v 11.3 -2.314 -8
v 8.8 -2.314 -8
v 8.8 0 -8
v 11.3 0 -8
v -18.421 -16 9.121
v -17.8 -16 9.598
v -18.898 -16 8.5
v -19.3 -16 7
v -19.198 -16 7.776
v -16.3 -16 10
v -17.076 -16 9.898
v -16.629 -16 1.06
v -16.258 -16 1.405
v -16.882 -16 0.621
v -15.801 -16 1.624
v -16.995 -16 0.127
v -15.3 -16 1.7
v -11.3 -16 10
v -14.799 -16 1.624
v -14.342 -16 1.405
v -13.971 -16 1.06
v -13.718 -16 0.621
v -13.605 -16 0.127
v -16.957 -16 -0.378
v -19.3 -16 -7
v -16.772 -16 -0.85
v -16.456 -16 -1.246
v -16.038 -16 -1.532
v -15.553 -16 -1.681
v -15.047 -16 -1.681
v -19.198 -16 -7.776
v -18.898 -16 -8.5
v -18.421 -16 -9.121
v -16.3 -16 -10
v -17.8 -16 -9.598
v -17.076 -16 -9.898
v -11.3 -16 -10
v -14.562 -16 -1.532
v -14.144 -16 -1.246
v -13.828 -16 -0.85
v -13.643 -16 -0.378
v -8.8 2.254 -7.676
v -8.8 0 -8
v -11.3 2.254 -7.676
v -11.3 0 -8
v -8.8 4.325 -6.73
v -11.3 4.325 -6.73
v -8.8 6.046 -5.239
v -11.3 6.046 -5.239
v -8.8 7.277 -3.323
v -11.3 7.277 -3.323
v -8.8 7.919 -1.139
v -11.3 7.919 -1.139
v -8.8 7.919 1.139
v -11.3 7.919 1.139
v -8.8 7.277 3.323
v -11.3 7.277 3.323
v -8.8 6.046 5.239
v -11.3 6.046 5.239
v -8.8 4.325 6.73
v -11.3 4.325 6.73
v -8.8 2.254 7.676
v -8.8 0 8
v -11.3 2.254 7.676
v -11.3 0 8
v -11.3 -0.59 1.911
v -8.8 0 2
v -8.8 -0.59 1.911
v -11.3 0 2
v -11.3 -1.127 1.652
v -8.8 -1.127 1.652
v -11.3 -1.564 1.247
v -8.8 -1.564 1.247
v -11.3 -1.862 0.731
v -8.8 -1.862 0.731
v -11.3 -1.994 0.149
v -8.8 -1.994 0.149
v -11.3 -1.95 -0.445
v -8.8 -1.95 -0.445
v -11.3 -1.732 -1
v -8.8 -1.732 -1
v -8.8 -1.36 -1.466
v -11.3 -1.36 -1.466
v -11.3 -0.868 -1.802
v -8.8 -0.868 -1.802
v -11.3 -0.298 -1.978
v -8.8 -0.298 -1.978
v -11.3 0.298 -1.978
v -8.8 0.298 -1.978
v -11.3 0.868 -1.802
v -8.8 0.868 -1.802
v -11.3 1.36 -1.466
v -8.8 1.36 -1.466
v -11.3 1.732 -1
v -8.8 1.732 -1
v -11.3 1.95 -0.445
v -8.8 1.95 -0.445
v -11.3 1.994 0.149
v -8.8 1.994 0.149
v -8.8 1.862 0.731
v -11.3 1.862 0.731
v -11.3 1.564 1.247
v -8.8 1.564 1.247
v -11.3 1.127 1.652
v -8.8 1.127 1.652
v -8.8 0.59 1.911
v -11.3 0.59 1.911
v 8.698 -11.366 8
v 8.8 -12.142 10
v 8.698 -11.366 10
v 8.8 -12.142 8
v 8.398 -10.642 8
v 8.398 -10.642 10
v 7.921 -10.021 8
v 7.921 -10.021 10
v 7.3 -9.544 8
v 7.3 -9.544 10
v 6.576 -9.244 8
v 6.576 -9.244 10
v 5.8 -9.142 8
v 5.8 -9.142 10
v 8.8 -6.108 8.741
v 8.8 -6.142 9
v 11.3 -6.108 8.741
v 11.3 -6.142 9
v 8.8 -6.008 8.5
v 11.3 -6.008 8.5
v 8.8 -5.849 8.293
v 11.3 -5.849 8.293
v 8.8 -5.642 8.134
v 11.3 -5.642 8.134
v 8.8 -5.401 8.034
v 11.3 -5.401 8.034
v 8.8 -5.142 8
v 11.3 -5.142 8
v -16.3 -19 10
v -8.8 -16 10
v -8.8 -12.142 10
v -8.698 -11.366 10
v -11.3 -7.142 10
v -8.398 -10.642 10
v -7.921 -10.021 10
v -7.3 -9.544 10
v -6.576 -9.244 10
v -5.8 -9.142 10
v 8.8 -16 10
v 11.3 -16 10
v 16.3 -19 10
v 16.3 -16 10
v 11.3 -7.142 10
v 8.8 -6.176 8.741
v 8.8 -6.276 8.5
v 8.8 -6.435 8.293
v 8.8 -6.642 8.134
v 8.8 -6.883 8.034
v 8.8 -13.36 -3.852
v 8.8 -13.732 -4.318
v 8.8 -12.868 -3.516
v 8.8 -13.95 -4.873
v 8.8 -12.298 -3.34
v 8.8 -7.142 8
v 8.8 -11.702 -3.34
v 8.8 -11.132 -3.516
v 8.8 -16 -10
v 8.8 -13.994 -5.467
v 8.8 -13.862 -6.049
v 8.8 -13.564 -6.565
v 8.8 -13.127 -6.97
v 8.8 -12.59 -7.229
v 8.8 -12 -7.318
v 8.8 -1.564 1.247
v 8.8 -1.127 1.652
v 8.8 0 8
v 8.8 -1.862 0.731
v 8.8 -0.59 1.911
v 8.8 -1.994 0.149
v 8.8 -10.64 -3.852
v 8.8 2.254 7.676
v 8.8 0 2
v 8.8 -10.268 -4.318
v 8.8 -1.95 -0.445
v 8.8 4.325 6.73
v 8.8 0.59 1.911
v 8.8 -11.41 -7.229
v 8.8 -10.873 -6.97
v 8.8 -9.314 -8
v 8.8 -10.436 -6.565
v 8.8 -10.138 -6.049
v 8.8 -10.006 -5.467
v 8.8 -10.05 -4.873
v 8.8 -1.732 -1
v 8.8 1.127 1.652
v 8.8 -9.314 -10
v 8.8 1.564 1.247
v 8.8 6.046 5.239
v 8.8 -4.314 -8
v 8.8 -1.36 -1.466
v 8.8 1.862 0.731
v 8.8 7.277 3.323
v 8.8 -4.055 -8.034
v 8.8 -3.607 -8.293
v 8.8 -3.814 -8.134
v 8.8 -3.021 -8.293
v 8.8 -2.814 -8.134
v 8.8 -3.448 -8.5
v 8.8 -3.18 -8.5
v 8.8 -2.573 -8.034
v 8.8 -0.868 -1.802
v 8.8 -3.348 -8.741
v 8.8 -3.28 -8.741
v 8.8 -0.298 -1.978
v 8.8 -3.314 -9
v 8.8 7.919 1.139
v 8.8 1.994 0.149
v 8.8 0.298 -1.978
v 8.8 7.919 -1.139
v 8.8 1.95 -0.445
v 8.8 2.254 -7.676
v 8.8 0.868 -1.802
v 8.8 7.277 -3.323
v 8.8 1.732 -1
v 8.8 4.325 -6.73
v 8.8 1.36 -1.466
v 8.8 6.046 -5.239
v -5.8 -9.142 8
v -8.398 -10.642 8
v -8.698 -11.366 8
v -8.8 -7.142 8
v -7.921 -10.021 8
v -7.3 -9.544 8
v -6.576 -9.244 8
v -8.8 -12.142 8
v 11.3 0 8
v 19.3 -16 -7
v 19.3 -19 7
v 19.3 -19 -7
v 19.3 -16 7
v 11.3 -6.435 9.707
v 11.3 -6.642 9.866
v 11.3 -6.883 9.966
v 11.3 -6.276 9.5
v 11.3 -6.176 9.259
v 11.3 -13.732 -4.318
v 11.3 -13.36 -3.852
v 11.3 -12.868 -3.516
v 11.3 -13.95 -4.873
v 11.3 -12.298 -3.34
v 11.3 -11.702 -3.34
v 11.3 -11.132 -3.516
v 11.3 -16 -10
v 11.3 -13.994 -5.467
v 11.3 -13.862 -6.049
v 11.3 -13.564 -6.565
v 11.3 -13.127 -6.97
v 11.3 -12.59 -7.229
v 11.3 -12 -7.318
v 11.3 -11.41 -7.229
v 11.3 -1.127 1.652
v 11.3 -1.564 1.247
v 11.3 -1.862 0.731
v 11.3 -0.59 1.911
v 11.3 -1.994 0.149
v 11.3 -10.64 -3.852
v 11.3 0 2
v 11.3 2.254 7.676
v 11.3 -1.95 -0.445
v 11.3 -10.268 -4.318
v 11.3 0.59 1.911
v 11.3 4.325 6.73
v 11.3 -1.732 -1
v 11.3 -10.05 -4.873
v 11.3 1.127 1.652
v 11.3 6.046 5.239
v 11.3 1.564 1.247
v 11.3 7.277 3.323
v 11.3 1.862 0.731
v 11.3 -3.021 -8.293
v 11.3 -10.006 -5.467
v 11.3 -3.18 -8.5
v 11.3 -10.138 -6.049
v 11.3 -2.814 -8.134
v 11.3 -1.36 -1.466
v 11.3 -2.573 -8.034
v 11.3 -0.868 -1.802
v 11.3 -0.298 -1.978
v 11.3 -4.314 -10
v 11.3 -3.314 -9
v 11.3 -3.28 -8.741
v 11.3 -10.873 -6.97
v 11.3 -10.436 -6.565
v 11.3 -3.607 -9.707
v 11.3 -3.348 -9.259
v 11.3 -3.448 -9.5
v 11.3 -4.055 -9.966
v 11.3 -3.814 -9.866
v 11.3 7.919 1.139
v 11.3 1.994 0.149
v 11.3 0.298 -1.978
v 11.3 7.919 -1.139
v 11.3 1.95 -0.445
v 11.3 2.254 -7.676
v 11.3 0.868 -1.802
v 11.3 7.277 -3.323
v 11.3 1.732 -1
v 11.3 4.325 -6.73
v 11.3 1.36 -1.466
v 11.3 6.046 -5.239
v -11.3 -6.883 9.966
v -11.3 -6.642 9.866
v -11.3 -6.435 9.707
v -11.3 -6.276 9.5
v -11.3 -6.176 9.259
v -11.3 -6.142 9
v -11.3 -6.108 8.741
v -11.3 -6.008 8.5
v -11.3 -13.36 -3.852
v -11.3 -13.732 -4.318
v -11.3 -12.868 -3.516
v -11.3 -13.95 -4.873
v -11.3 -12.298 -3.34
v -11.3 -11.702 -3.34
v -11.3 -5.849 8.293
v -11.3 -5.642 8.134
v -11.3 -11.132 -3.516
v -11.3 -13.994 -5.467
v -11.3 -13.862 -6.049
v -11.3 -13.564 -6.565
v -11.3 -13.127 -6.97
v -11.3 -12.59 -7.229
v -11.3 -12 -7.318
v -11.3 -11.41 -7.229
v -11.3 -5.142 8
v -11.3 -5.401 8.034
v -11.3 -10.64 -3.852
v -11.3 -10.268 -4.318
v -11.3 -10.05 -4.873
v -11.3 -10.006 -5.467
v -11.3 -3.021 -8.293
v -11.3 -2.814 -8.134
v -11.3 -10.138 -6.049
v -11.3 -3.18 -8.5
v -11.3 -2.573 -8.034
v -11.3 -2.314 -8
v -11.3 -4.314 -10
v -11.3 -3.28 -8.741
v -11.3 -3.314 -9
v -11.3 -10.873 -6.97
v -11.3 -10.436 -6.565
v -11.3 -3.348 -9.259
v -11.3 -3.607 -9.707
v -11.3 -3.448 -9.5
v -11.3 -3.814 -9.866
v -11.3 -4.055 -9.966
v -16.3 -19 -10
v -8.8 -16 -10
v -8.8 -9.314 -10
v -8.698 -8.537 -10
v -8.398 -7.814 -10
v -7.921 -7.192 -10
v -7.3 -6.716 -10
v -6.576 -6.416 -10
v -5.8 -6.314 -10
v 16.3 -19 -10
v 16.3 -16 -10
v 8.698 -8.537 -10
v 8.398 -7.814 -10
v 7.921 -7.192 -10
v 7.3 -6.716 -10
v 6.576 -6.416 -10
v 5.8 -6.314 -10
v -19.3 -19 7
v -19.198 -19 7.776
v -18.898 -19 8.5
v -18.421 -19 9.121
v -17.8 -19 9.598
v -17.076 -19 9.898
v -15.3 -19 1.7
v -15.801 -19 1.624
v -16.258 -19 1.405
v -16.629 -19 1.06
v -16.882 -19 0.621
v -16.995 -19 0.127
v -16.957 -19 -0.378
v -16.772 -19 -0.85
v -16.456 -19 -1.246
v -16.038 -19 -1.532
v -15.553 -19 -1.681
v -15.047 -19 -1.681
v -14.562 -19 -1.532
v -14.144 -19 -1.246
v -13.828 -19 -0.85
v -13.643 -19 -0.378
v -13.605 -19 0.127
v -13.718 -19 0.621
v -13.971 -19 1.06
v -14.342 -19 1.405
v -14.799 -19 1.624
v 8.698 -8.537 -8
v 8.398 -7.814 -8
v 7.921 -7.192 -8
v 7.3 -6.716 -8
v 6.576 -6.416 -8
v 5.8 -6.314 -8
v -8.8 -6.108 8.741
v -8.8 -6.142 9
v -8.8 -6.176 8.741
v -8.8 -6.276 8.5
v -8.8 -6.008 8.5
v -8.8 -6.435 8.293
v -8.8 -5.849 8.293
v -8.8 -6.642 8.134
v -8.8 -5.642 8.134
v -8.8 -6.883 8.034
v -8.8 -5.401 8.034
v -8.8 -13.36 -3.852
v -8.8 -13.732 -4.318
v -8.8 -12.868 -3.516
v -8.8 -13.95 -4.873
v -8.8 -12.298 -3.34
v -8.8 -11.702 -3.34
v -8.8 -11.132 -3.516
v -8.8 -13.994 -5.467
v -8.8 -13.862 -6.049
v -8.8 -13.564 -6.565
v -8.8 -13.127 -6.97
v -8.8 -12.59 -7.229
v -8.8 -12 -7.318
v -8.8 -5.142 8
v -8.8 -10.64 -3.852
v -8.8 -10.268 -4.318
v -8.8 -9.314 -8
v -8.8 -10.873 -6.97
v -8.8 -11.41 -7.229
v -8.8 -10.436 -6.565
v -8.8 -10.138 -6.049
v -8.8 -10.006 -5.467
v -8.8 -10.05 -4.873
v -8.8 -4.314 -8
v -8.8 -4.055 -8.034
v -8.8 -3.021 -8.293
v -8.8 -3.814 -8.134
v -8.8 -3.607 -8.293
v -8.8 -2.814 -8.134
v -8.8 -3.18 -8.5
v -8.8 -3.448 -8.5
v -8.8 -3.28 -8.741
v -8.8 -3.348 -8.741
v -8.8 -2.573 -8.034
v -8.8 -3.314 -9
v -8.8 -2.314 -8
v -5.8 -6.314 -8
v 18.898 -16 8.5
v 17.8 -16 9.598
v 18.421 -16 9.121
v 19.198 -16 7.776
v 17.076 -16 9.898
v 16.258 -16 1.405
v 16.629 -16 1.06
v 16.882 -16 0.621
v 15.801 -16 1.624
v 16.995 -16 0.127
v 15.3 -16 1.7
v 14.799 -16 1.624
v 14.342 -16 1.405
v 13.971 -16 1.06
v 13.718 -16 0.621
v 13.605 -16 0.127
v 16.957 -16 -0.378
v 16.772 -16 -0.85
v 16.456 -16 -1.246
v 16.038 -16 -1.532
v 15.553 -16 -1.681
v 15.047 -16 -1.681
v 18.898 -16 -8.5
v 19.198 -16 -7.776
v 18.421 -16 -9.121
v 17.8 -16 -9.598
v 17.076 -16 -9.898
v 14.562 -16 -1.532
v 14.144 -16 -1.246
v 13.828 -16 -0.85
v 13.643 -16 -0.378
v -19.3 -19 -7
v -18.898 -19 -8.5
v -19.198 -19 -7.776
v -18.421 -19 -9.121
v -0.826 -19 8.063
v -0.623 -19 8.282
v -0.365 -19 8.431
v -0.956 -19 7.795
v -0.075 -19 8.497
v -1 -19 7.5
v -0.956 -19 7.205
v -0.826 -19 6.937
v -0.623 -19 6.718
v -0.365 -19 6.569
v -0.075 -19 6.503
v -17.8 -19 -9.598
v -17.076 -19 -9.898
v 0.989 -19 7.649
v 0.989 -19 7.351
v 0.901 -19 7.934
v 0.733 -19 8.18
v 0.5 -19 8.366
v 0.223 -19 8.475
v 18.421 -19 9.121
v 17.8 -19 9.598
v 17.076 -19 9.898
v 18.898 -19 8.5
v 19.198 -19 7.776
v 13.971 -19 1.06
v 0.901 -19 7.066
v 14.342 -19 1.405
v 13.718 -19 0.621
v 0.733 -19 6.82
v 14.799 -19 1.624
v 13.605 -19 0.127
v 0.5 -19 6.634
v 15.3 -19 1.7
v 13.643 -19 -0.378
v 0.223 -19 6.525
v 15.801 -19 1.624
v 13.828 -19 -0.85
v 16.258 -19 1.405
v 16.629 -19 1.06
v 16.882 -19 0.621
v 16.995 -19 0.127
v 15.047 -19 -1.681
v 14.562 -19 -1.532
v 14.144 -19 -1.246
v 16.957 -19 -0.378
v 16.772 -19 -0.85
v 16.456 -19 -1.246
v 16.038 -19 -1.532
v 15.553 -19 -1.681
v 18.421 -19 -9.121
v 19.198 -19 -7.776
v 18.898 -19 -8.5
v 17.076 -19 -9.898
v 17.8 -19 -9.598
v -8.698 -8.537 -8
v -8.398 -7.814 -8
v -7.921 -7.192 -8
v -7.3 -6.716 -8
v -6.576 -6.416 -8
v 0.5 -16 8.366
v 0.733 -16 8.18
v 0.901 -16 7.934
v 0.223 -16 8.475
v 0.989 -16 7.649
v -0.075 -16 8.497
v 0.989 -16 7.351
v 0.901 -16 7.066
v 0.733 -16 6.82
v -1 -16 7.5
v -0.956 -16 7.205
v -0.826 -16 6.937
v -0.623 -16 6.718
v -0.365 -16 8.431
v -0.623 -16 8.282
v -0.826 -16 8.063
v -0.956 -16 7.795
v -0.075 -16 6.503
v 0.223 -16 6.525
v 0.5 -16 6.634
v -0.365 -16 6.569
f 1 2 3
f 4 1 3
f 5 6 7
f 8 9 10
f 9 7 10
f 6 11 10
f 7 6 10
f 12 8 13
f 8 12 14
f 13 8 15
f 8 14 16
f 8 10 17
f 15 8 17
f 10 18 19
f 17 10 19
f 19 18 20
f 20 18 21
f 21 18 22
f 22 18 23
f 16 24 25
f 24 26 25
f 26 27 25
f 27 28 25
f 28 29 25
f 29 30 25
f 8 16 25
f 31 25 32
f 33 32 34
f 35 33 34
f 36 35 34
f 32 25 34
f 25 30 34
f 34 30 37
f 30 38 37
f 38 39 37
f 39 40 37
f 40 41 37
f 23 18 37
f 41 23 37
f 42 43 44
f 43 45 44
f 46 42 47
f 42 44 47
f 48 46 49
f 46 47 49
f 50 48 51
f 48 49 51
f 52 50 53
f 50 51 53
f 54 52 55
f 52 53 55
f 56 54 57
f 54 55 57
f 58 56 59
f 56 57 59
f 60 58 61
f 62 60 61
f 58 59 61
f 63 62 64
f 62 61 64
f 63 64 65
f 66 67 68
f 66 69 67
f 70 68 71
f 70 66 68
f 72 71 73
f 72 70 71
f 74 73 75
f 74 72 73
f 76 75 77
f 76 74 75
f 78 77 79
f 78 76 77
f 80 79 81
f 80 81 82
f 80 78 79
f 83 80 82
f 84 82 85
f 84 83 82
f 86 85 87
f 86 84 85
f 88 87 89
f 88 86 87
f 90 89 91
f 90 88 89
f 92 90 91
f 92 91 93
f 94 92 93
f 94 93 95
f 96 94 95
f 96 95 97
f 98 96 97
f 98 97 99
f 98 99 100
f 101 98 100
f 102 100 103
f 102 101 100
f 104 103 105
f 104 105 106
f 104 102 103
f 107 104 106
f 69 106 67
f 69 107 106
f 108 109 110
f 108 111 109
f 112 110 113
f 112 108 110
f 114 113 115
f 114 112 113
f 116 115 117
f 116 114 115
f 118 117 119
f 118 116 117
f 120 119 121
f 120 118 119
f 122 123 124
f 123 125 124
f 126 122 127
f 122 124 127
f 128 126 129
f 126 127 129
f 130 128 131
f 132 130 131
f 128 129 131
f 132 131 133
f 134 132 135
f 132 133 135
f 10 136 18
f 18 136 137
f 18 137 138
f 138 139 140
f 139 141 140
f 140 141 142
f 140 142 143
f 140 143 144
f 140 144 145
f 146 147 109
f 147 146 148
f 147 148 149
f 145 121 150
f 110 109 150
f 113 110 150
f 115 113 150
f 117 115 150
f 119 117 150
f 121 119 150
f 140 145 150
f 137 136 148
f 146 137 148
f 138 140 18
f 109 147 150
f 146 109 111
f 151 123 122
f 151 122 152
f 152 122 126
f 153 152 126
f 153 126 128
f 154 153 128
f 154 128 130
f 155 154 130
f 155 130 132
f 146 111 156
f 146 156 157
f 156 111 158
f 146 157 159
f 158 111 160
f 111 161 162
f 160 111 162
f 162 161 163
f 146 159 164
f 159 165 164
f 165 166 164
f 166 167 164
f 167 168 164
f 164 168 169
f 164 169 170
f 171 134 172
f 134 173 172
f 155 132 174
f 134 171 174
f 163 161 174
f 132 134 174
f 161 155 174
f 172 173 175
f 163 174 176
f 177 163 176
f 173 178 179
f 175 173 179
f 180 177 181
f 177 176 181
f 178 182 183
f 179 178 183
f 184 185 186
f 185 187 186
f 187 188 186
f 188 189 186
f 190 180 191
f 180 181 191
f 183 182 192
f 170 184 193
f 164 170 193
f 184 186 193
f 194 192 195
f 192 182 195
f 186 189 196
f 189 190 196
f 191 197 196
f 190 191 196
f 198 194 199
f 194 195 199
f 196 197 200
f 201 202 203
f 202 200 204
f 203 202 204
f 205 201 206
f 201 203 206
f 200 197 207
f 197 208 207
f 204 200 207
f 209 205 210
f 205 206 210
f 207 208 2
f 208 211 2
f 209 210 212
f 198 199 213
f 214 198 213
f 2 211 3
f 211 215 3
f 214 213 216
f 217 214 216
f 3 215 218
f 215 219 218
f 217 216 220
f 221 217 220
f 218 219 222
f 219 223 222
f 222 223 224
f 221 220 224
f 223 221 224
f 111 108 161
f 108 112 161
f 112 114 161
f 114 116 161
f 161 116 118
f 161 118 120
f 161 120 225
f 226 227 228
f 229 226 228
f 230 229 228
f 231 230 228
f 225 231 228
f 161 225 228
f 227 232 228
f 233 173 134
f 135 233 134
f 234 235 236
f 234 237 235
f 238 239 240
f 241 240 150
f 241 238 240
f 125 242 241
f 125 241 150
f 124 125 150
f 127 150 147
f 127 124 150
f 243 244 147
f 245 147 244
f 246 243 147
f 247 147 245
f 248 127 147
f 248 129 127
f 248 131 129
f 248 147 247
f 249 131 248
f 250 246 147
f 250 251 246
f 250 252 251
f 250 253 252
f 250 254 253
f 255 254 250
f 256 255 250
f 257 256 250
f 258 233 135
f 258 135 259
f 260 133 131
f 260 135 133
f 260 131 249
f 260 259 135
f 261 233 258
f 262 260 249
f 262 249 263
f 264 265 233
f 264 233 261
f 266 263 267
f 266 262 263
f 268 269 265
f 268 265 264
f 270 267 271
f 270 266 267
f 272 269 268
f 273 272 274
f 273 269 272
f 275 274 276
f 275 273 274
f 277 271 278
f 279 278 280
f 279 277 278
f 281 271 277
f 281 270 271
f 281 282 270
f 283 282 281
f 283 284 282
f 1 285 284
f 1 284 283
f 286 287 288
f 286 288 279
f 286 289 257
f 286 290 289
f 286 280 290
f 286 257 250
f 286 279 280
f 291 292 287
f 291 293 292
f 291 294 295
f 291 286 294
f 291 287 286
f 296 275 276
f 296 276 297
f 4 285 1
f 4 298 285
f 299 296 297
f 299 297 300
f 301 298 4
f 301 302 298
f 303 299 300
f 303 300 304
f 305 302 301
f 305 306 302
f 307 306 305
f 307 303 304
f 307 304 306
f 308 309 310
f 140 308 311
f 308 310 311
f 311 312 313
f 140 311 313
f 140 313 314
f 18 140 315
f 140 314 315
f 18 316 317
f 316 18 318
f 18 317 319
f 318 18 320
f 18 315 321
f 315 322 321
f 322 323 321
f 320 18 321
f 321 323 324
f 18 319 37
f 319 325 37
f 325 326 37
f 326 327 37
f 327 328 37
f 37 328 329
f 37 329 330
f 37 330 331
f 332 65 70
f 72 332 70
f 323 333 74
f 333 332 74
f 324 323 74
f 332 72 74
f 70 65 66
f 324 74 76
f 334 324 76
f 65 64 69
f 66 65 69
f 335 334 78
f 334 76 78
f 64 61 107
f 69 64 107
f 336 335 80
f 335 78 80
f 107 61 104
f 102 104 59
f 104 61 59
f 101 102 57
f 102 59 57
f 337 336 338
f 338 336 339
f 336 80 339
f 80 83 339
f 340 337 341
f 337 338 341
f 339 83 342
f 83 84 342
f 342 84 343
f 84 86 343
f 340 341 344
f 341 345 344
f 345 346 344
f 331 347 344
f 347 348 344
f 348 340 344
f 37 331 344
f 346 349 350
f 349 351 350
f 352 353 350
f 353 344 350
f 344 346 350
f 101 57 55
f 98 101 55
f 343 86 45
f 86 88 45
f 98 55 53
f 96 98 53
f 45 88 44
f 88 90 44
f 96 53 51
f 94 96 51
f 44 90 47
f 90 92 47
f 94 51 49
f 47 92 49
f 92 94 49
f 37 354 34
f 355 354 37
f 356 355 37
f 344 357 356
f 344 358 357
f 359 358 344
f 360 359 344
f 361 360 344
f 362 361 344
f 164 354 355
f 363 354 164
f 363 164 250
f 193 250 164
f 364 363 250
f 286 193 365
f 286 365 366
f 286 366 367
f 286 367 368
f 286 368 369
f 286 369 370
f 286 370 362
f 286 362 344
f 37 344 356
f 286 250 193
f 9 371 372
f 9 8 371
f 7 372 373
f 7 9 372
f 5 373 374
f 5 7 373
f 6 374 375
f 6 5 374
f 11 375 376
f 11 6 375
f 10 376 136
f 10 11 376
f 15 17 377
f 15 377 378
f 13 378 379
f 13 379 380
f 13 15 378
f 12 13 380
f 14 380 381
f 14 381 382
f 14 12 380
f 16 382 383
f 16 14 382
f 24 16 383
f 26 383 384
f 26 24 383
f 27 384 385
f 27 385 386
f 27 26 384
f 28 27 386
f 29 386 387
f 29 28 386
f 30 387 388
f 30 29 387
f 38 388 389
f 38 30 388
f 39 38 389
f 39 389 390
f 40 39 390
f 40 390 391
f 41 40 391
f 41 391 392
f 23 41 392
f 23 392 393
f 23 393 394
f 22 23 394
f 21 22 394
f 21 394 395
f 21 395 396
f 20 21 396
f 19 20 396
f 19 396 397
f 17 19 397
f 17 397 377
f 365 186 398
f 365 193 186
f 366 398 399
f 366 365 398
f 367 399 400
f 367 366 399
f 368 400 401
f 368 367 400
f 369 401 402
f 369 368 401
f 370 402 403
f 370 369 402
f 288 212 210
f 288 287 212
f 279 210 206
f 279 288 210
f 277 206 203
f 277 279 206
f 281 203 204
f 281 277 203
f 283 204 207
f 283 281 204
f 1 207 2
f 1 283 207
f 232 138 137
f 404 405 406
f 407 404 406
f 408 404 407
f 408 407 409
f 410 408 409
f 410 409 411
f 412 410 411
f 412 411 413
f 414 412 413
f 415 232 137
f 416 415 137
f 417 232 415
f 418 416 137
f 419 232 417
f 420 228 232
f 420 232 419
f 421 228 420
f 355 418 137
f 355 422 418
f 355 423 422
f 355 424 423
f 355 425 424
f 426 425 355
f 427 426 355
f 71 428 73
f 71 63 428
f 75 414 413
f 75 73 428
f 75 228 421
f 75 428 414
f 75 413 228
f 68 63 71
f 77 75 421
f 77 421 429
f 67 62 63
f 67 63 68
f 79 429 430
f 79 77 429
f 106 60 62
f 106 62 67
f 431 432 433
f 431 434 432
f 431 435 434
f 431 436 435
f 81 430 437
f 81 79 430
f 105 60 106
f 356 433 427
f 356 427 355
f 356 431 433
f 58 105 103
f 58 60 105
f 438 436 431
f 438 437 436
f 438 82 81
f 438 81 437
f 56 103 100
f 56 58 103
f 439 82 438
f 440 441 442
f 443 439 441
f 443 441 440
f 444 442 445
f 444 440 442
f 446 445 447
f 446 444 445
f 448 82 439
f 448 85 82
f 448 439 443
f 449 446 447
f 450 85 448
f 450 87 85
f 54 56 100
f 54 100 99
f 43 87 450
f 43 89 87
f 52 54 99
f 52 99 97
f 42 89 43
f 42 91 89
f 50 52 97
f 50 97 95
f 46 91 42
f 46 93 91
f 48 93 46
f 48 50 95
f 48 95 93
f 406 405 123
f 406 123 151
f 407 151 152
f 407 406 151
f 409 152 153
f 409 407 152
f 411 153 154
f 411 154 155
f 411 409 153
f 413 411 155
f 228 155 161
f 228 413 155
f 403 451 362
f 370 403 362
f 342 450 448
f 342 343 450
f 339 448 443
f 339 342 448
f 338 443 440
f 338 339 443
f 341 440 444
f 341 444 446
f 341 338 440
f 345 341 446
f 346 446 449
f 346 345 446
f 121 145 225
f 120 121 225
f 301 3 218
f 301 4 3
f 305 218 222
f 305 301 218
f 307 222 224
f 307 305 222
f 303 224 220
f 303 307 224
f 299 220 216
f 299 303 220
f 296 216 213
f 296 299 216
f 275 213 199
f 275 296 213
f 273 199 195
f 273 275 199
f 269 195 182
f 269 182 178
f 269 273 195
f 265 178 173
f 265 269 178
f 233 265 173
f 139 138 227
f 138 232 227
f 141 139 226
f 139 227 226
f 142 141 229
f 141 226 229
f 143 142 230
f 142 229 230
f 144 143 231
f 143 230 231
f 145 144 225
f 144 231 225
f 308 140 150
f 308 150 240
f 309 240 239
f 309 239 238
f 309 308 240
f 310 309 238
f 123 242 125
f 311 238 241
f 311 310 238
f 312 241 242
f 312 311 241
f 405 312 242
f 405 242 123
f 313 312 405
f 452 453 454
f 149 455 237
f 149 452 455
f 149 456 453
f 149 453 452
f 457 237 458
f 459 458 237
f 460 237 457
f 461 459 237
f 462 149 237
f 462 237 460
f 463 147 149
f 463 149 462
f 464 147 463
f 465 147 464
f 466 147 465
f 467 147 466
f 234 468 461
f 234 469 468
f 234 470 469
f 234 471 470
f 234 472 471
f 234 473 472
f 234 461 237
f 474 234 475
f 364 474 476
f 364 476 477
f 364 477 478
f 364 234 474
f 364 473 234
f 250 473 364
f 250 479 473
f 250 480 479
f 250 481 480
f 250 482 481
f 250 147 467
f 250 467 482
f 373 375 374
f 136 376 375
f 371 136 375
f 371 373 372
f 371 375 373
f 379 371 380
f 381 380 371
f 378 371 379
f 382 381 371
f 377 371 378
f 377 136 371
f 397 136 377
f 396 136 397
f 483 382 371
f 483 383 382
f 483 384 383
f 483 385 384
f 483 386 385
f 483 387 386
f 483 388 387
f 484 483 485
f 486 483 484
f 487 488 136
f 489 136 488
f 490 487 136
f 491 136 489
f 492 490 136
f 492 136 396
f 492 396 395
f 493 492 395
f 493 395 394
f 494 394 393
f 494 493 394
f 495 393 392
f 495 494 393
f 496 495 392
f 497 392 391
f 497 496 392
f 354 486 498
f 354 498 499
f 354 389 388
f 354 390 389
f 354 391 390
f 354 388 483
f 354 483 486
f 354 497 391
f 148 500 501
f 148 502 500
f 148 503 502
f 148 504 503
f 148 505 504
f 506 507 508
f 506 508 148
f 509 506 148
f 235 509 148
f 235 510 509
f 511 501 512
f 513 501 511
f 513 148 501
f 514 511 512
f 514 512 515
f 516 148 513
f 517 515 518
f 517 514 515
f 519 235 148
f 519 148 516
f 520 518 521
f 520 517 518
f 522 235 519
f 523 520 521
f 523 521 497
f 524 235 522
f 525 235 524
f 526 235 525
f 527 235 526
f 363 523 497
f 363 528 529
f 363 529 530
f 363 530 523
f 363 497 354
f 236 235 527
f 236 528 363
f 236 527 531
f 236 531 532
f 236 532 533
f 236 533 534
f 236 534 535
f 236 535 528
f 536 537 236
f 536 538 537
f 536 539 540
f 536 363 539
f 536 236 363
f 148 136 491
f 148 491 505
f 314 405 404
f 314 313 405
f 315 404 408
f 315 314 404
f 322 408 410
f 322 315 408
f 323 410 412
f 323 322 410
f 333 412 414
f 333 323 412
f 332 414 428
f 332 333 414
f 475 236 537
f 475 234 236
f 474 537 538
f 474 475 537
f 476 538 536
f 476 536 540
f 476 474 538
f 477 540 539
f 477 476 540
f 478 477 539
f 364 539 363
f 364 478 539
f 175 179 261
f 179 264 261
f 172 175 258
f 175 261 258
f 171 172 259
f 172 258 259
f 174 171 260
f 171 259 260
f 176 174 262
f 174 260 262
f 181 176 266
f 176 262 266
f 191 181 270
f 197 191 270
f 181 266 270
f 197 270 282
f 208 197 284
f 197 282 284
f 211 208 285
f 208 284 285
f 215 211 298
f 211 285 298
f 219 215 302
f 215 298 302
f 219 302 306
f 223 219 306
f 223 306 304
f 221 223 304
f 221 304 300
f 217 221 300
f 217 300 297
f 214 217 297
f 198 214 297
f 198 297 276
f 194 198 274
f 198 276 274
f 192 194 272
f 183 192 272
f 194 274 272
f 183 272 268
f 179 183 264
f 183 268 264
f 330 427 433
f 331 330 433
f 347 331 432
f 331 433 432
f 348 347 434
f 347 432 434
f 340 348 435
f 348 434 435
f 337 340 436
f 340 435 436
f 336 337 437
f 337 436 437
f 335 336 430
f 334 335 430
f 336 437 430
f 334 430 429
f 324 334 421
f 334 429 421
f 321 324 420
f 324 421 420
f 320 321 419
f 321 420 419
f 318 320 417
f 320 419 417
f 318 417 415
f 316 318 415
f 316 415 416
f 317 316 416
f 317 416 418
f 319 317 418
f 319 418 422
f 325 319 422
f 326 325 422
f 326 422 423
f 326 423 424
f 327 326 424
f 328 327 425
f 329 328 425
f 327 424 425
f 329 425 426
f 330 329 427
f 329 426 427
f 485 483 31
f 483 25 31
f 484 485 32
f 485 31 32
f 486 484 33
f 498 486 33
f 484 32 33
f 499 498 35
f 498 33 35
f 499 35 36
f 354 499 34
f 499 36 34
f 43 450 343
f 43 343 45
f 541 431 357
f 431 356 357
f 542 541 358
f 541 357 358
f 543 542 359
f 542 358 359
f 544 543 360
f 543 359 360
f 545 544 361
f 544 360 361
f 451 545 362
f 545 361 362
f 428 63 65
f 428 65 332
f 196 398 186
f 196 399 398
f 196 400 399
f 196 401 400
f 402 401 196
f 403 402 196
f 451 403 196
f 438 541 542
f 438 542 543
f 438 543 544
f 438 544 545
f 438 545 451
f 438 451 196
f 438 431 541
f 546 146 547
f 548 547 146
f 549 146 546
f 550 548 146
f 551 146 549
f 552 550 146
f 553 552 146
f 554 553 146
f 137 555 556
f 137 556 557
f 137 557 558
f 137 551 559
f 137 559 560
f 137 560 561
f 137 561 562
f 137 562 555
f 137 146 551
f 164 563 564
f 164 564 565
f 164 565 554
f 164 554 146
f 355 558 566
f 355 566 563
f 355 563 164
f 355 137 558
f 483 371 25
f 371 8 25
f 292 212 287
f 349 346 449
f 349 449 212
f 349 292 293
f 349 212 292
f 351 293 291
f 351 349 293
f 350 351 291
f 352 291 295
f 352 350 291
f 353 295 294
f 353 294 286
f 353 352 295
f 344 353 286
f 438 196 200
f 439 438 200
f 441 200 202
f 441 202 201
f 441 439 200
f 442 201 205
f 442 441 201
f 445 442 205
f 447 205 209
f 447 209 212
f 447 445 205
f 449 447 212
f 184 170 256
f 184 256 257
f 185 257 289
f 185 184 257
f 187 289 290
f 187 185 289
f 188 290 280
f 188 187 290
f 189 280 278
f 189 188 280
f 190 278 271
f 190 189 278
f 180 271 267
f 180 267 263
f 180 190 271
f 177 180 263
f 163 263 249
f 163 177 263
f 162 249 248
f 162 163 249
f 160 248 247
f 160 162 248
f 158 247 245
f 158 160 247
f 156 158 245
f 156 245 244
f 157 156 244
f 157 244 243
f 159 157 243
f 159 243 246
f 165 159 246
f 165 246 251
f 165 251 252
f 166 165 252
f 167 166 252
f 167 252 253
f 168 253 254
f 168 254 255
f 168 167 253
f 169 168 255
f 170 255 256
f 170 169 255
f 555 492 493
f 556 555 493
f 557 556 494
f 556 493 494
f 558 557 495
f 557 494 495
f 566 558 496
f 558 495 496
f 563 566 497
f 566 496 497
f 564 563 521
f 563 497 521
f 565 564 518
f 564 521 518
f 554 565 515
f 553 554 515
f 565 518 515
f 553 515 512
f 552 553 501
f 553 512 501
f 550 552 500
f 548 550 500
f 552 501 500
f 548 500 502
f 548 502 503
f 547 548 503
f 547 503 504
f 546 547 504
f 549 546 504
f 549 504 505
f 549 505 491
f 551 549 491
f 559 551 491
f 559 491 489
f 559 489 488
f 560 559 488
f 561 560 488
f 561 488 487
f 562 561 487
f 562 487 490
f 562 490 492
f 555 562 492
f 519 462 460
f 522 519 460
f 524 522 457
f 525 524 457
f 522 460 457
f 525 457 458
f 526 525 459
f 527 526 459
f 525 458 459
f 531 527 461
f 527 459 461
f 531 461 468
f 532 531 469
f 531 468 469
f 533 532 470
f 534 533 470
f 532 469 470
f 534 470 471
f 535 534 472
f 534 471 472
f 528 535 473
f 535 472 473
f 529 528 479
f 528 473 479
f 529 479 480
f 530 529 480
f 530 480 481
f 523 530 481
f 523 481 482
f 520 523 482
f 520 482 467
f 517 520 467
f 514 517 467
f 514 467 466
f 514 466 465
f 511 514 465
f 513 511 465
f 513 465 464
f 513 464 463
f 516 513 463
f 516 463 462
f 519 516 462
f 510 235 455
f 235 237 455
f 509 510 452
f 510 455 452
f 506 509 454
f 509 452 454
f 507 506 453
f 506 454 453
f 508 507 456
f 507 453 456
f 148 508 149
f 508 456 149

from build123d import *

# Parameters (mm, degrees)
ESQUISSE2_W                    = 2.5
ESQUISSE2_H                    = 6
BOSS_EXTRU_1_START             = -2.5
ESQUISSE3_R                    = 2
BOSS_EXTRU_1_DEPTH             = 2.5
BOSS_EXTRU_2_START             = -2.5
ESQUISSE3_3_W                  = 20
ESQUISSE3_3_H                  = 3
ESQUISSE3_3_W_2                = 2
BOSS_EXTRU_2_DEPTH             = 8.8
ESQUISSE3_5_W                  = 20
ESQUISSE3_5_H                  = 3
BOSS_EXTRUDE1_DEPTH            = 8
CUT_EXTRUDE1_REACH             = 34.38
SKETCH4_R                      = 1.7
TROUS_DE_CENTRAGE_2_0MM1_D     = 2
TROUS_DE_CENTRAGE_2_0MM1_DEPTH = 3
FILLET1_R                      = 1
FILLET2_START                  = -8.8
FILLET2_DEPTH                  = 17.6
FILLET2_START_2                = -19.3
FILLET2_2_DEPTH                = 38.6
FILLET3_R                      = 3


with BuildPart() as part:
    # Esquisse2 → Révolution1 (revolve)
    with BuildSketch(Plane.XY, mode=Mode.PRIVATE) as r_volution1_sk:
        with Locations((10.05, 5)):
            Rectangle(ESQUISSE2_W, ESQUISSE2_H)
    revolve(r_volution1_sk.sketch.rotate(Axis((-2.14668318, 0, 0), (1, 0, 0)), 90), axis=Axis((-2.14668318, 0, 0), (1, 0, 0)))

    # Esquisse3 → Boss.-Extru.1 (add)
    with BuildSketch(Plane(origin=(11.3, 0, 0), x_dir=(0, 0, -1), z_dir=(1, 0, 0)).offset(BOSS_EXTRU_1_START)):
        with BuildLine():
            Line((-10, -19), (10, -19))
            Line((10, -19), (10, -3.313708499))
            Line((10, -3.313708499), (8, -3.313708499))
            Line((8, -3.313708499), (8, 0))
            ThreePointArc((8, 0), (0, -8), (-8, 0))
            Line((-8, 0), (-8, -6.142135624))
            Line((-8, -6.142135624), (-10, -6.142135624))
            Line((-10, -6.142135624), (-10, -19))
        make_face()
        with Locations((5.318, -12)):
            Circle(ESQUISSE3_R, mode=Mode.SUBTRACT)
    extrude(amount=BOSS_EXTRU_1_DEPTH)

    # Esquisse3<3> → Boss.-Extru.2 (add)
    with BuildSketch(Plane(origin=(11.3, 0, 0), x_dir=(0, 0, -1), z_dir=(1, 0, 0)).offset(BOSS_EXTRU_2_START)):
        with Locations((0, -17.5)):
            Rectangle(ESQUISSE3_3_W, ESQUISSE3_3_H)
        with Locations((-9, -7.642135624)):
            Rectangle(ESQUISSE3_3_W_2, ESQUISSE3_3_H)
        with Locations((9, -4.813708499)):
            Rectangle(ESQUISSE3_3_W_2, ESQUISSE3_3_H)
    extrude(amount=-BOSS_EXTRU_2_DEPTH)

    # Esquisse3<5> → Boss-Extrude1 (add)
    with BuildSketch(Plane(origin=(11.3, 0, 0), x_dir=(0, 0, -1), z_dir=(1, 0, 0))):
        with Locations((0, -17.5)):
            Rectangle(ESQUISSE3_5_W, ESQUISSE3_5_H)
    extrude(amount=BOSS_EXTRUDE1_DEPTH)

    # Sketch4 → Cut-Extrude1 (cut, up to next)
    with BuildSketch(Plane(origin=(0, -16, 0), x_dir=(1, 0, 0), z_dir=(0, 1, 0)), mode=Mode.PRIVATE) as cut_extrude1_sk1:
        with Locations(Location((15.3, 0, 0), (0, 0, 270))):
            Circle(SKETCH4_R)
    cut_extrude1_tool1 = extrude(cut_extrude1_sk1.sketch, amount=-CUT_EXTRUDE1_REACH, mode=Mode.PRIVATE) & part.part
    add(cut_extrude1_tool1.solids().sort_by_distance((15.3, -16, 0))[0], mode=Mode.SUBTRACT)

    # Symétrie1: part across plane


with BuildPart() as part_1:
    add(part.part)
    add(part.part.mirror(Plane(origin=(0, 0, 0), x_dir=(0, 0, 1), z_dir=(1, 0, 0))))

    # Trous de centrage Ø2.0mm1
    with Locations(Plane(origin=(0, -16, 0), x_dir=(1, 0, 0), z_dir=(0, 1, 0))):
        with Locations((0, -7.5)):
            Hole(TROUS_DE_CENTRAGE_2_0MM1_D / 2, depth=TROUS_DE_CENTRAGE_2_0MM1_DEPTH)

    # Fillet1
    fillet1_edges = [part_1.edges().sort_by_distance(p)[0] for p in [
        (-10.05, -3.313708499, -8),
        (-10.05, -6.142135624, 8),
        (10.05, -3.313708499, -8),
        (10.05, -6.142135624, 8),
    ]]
    fillet(fillet1_edges, radius=FILLET1_R)

    # Fillet2: read off the stored shape, not the designer's step
    # Fillet2 outline → Fillet2 (cut)
    with BuildSketch(Plane.YZ.offset(FILLET2_START)):
        with BuildLine():
            ThreePointArc((-4.313708499, -8), (-3.606601718, -8.292893219), (-3.313708499, -9))
            Line((-3.313708499, -9), (-3.313708499, -8))
            Line((-3.313708499, -8), (-4.313708499, -8))
        make_face()
        with BuildLine():
            ThreePointArc((-3.313708499, -9), (-3.606601718, -9.707106781), (-4.313708499, -10))
            Line((-4.313708499, -10), (-3.313708499, -10))
            Line((-3.313708499, -10), (-3.313708499, -9))
        make_face()
        with BuildLine():
            Line((-6.142135624, 8), (-6.142135624, 9))
            ThreePointArc((-6.142135624, 9), (-6.435028843, 8.292893219), (-7.142135624, 8))
            Line((-7.142135624, 8), (-6.142135624, 8))
        make_face()
        with BuildLine():
            ThreePointArc((-7.142135624, 10), (-6.435028843, 9.707106781), (-6.142135624, 9))
            Line((-6.142135624, 9), (-6.142135624, 10))
            Line((-6.142135624, 10), (-7.142135624, 10))
        make_face()
    extrude(amount=FILLET2_DEPTH, mode=Mode.SUBTRACT)

    # Fillet2 2 outline → Fillet2 2 (cut)
    with BuildSketch(Plane.YZ.offset(FILLET2_START_2)):
        with BuildLine():
            ThreePointArc((-3.313708499, -9), (-3.606601718, -9.707106781), (-4.313708499, -10))
            Line((-4.313708499, -10), (-3.313708499, -10))
            Line((-3.313708499, -10), (-3.313708499, -9))
        make_face()
        with BuildLine():
            ThreePointArc((-7.142135624, 10), (-6.435028843, 9.707106781), (-6.142135624, 9))
            Line((-6.142135624, 9), (-6.142135624, 10))
            Line((-6.142135624, 10), (-7.142135624, 10))
        make_face()
    extrude(amount=FILLET2_2_DEPTH, mode=Mode.SUBTRACT)

    # Fillet3
    fillet3_edges = [part_1.edges().sort_by_distance(p)[0] for p in [
        (-8.8, -6.313708499, -9),
        (-19.3, -17.5, -10),
        (8.8, -6.313708499, -9),
        (8.8, -9.142135624, 9),
        (19.3, -17.5, -10),
        (19.3, -17.5, 10),
        (-8.8, -9.142135624, 9),
        (-19.3, -17.5, 10),
    ]]
    fillet(fillet3_edges, radius=FILLET3_R)


solid = part_1.part
